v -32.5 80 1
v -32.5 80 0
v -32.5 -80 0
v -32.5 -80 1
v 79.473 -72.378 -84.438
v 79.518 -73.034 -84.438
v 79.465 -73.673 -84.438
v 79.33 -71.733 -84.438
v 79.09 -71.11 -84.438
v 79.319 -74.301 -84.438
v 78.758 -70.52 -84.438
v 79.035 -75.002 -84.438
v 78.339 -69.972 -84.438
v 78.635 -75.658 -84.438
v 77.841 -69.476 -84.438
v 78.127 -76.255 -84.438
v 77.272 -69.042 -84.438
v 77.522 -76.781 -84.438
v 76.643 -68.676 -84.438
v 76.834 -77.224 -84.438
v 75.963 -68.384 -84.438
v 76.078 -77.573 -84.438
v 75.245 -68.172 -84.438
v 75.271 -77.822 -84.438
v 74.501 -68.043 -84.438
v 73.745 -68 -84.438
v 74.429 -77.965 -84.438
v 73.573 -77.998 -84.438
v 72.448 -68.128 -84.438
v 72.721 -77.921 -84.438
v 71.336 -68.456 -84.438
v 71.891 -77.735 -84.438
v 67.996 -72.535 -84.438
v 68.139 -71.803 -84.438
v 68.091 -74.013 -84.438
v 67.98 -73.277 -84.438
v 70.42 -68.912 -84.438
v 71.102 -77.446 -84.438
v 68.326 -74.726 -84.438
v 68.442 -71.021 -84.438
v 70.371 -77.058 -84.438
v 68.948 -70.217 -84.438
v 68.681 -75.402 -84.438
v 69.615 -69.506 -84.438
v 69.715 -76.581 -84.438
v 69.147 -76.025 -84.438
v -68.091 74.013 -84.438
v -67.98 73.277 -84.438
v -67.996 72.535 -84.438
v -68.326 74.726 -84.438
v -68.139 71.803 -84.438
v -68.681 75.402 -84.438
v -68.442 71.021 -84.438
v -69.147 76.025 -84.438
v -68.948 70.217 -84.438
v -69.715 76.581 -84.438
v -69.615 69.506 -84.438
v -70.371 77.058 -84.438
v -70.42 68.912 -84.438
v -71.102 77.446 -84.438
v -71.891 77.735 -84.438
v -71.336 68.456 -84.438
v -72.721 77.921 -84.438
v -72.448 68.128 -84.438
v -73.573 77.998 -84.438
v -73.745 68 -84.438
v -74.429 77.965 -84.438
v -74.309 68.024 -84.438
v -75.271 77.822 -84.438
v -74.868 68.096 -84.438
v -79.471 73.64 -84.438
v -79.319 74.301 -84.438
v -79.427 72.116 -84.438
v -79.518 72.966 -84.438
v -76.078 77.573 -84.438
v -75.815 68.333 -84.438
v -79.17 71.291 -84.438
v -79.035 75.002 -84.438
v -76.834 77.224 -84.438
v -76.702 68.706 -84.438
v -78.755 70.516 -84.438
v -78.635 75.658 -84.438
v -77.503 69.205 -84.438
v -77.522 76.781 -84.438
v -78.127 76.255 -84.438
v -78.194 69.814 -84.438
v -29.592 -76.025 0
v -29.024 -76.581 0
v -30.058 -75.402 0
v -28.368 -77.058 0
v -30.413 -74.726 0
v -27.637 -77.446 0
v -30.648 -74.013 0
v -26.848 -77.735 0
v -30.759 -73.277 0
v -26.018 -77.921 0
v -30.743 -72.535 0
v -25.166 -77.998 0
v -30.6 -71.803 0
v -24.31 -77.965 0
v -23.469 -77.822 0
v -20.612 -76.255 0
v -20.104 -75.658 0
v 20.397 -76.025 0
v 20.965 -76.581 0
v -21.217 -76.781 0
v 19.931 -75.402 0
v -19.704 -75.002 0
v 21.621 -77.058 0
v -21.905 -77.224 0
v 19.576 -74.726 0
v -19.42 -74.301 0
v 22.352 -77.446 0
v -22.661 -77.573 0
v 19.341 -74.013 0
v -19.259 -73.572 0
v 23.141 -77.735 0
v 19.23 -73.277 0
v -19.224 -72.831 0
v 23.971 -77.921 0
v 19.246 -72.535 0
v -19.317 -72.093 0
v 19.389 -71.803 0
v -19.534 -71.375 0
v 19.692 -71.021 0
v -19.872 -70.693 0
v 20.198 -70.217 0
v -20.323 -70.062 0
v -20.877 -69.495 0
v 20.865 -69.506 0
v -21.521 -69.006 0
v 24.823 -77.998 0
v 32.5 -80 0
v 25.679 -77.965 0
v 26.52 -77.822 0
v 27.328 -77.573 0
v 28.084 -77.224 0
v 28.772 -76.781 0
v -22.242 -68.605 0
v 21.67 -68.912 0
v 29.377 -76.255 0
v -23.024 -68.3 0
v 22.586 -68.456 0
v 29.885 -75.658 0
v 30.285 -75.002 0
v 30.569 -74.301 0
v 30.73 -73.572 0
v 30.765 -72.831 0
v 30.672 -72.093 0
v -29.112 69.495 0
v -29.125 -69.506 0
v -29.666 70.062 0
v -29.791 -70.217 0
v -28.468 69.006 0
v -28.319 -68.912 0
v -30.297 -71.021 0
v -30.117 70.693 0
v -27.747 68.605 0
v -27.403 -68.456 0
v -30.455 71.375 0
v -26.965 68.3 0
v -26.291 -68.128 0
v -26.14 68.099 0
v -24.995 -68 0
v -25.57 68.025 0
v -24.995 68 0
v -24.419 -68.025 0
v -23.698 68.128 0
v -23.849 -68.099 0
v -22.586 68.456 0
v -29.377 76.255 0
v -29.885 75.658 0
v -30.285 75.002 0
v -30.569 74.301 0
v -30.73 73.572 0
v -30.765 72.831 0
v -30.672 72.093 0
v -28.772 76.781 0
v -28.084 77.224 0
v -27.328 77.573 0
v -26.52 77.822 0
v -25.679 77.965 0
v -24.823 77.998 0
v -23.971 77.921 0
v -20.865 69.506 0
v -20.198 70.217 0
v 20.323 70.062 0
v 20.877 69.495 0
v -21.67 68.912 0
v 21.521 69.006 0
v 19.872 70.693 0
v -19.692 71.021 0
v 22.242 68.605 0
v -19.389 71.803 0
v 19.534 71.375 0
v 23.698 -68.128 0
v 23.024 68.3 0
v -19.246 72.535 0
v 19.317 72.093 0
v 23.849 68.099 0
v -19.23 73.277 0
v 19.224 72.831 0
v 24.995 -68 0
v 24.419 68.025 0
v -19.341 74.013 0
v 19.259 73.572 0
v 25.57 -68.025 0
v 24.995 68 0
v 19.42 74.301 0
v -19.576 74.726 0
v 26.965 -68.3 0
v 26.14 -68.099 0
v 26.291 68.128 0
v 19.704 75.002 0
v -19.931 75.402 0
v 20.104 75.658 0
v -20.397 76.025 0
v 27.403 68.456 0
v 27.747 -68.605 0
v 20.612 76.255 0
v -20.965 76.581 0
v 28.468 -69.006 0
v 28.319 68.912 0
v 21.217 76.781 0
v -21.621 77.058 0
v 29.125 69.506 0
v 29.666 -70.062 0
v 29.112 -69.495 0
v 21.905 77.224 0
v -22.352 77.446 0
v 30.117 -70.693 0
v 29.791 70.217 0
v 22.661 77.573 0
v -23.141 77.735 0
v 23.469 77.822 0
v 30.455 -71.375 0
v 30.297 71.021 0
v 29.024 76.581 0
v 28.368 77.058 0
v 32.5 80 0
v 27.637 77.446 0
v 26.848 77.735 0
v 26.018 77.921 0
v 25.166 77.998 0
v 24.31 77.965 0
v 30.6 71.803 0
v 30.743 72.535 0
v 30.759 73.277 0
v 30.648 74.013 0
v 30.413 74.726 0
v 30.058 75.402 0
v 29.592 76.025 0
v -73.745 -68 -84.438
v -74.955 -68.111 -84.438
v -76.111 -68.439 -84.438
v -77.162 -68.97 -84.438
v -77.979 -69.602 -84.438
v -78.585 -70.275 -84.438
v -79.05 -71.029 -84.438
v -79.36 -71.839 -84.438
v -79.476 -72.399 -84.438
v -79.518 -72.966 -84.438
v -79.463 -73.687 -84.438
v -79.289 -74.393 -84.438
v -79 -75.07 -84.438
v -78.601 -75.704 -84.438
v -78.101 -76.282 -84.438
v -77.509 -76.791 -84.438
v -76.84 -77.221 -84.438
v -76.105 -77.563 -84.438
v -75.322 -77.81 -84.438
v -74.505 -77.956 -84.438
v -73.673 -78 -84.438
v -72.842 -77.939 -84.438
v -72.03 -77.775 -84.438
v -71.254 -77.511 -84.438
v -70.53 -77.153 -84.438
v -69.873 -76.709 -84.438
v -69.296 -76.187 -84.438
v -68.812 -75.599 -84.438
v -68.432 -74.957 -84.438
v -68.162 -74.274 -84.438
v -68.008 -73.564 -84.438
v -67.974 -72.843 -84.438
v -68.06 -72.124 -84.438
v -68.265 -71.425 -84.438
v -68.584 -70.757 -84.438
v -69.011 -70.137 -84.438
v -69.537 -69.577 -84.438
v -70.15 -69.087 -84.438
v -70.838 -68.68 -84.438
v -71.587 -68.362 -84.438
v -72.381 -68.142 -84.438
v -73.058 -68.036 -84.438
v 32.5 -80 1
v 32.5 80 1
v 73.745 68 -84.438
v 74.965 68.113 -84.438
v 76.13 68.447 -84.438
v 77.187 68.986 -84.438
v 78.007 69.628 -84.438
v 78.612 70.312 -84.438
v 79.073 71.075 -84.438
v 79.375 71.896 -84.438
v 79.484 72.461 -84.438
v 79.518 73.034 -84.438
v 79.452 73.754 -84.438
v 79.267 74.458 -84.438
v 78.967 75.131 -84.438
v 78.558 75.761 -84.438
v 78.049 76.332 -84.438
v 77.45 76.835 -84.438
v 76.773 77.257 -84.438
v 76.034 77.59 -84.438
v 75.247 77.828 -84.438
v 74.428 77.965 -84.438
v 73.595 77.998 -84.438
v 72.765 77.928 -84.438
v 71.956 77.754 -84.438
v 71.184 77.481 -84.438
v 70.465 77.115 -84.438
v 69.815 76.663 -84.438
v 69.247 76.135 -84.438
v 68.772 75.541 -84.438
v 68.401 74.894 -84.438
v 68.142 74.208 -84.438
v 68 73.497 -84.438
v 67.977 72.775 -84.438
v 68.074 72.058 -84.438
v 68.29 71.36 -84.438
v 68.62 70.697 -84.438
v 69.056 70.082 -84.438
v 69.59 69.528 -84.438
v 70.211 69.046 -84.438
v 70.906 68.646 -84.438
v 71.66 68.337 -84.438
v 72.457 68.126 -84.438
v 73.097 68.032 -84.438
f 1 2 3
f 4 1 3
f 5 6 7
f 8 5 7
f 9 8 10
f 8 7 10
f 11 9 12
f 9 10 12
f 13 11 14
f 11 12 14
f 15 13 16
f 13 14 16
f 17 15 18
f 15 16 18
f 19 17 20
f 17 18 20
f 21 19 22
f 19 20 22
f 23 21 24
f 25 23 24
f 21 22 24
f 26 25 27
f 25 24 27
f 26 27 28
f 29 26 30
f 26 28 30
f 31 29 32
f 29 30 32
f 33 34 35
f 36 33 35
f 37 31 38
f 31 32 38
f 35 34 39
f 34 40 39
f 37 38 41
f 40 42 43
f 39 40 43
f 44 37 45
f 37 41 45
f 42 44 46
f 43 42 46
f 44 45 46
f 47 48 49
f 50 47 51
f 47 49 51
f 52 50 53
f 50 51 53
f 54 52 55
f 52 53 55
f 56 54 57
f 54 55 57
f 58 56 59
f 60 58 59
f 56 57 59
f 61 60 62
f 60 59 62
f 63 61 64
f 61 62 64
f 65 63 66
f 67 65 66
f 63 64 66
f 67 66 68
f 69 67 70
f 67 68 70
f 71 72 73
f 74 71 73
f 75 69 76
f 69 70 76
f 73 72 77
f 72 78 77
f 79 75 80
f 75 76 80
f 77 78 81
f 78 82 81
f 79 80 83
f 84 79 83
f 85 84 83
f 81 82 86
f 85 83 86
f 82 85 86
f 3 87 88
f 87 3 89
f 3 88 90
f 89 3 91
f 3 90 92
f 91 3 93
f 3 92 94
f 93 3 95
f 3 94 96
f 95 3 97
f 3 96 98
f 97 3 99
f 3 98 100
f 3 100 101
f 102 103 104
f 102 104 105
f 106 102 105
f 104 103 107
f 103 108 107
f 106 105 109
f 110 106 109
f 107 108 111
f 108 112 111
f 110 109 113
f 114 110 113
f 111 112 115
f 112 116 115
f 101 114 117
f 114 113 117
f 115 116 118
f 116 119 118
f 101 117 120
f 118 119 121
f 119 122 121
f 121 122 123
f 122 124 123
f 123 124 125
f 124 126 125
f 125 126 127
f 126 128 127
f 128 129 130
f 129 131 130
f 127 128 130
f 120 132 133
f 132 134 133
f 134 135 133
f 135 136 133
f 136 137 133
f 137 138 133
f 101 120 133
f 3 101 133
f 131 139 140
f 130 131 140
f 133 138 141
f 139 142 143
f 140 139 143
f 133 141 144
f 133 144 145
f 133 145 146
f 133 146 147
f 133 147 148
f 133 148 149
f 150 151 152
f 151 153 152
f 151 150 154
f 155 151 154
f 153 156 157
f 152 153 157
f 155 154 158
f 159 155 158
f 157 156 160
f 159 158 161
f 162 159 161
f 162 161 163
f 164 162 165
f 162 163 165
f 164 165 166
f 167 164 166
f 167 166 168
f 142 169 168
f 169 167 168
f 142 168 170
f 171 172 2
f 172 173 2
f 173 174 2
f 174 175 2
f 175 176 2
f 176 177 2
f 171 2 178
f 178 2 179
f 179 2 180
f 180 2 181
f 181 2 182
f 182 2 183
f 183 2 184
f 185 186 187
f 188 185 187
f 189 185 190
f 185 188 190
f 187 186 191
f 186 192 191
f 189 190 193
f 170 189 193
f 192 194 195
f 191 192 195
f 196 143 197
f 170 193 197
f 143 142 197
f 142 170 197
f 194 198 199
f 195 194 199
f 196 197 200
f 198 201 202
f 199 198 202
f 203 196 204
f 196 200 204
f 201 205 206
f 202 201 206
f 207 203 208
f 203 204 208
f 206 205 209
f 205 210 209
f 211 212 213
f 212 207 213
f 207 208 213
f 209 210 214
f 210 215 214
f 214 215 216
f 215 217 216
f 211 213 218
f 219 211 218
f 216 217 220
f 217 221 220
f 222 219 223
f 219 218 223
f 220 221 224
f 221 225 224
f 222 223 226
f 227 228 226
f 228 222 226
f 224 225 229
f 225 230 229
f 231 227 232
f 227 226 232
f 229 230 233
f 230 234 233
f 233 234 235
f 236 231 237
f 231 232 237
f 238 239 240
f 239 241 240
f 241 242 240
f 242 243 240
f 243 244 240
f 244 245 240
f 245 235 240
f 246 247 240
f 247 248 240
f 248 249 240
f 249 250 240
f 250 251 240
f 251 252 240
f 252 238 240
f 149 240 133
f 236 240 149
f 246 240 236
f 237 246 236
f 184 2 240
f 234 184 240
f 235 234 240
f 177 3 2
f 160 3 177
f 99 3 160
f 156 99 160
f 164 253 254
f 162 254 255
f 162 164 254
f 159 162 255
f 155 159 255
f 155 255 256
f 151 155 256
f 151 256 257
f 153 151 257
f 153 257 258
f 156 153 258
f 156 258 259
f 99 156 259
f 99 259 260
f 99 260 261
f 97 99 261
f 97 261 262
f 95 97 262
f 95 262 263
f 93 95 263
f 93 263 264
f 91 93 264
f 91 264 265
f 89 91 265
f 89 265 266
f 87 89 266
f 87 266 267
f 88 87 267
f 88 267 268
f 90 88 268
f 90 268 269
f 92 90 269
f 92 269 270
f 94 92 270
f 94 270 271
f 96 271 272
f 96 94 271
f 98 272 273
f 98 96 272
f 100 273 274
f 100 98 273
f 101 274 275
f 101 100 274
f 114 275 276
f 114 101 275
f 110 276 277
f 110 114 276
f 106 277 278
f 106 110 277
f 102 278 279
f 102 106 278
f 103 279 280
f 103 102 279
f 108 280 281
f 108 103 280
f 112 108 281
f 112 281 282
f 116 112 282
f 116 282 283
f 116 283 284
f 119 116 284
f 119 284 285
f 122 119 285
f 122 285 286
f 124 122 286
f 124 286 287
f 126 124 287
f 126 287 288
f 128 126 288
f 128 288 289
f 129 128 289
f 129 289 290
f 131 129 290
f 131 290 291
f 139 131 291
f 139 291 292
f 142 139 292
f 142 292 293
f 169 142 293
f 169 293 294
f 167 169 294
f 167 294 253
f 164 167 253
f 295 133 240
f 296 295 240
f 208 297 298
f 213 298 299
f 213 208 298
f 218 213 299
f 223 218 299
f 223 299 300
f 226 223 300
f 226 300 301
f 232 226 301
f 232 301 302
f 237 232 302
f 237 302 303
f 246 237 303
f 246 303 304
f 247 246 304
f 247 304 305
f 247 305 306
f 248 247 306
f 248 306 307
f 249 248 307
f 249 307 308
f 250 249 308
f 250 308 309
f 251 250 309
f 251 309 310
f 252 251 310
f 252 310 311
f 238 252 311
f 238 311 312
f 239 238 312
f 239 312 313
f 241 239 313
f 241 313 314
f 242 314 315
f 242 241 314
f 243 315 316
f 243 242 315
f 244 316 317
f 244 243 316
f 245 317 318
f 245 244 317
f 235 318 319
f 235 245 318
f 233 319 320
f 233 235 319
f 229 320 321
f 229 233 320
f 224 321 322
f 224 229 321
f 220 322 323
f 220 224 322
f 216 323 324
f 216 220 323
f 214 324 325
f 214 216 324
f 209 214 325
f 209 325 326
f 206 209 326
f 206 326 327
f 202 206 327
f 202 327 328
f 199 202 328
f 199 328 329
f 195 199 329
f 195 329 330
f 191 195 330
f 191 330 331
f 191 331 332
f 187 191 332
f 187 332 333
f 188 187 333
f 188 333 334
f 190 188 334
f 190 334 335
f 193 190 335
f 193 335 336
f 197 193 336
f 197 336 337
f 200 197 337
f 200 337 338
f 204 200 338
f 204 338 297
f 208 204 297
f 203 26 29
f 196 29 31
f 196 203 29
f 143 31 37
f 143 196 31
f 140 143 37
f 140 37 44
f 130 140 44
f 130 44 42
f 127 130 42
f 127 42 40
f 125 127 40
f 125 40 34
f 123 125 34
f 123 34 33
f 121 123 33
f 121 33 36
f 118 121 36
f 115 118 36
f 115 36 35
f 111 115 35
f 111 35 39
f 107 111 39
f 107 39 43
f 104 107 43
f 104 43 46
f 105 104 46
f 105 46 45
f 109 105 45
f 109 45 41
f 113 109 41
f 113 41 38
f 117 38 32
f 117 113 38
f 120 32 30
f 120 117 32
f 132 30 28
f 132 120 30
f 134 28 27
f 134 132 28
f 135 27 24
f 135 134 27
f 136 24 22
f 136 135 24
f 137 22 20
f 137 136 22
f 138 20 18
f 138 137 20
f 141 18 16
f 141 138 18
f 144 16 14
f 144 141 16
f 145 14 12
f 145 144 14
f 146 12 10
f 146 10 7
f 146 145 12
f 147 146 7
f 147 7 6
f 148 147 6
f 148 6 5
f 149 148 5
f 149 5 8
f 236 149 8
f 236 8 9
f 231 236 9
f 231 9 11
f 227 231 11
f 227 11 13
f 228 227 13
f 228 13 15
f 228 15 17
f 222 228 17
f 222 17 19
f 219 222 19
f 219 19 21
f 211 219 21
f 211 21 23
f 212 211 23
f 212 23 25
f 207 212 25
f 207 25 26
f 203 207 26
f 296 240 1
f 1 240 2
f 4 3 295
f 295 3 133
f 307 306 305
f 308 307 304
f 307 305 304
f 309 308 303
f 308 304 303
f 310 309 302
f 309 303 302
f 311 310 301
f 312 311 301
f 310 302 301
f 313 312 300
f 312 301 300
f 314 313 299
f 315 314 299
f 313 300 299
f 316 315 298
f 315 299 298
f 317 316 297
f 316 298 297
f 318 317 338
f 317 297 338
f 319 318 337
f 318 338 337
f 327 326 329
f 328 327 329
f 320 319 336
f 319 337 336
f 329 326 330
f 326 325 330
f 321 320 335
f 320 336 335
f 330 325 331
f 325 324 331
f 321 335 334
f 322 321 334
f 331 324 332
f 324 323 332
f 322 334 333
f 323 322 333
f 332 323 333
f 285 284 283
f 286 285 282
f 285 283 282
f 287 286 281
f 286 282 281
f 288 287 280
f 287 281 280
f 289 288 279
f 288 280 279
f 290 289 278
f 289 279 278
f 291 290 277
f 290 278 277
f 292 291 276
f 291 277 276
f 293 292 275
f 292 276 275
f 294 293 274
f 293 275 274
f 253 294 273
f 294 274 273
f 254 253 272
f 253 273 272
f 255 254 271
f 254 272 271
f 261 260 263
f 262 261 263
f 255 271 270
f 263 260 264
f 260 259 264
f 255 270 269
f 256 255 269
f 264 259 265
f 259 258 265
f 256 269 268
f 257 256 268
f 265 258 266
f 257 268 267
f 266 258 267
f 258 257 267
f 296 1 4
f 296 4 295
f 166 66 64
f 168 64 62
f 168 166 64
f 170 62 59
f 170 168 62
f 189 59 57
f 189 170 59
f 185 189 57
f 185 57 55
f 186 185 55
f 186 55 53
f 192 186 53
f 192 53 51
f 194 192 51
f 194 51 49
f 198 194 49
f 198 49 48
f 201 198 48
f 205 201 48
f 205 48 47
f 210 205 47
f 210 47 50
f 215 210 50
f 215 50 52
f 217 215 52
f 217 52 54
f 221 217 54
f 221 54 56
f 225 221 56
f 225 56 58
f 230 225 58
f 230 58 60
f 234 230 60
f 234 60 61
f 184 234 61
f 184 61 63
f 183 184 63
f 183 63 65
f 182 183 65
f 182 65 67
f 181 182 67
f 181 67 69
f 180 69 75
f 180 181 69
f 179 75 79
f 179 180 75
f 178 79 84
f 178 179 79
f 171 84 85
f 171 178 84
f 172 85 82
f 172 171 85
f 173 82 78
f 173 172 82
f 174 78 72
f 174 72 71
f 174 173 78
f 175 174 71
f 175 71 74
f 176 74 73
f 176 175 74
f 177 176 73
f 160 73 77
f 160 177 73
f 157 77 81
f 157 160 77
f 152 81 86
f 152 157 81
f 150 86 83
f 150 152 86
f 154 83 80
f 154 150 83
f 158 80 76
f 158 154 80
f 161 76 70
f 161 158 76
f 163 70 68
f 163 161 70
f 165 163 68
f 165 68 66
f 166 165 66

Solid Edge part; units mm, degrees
sketch "Sketch1" plane through (0, 0, 0) normal (0, 0, 1) x (1, 0, 0)
  line L0 (32.5, 80) -> (-32.5, 80)
  line L1 (-32.5, 80) -> (-32.5, -80)
  line L2 (-32.5, -80) -> (32.5, -80)
  line L3 (32.5, -80) -> (32.5, 80)
  dimension "D1" = 65
  dimension "D2" = 160
extrude "Protrusion1" add sketch "Sketch1" along normal blind 1
sketch "Sketch2" plane through (5.2285, 0, 16.7452) normal (0.5, 0, 0.8660254) x (0, 1, 0)
  circle A0 centre (-73, 17.8013) radius 5
  dimension "D1" = 10
  dimension "D2" = 7
extrude "ProtrusioneEstrusa_4" add sketch "Sketch2" against normal blind 130
mirror "Mirror1" about plane through (0, 0, 0) normal (1, 0, 0) of "ProtrusioneEstrusa_4"
mirror "Mirror2" about plane through (0, 0, 0) normal (0, -1, 0) of "Mirror1", "ProtrusioneEstrusa_4"
sketch "Sketch3" plane through (0, -80, 1.5) normal (0, -1, 0) x (1, 0, 0)
  line L0 (32.5, 26.6458) -> (-32.5, 26.6458)
  line L1 (-32.5, 26.6458) -> (-32.5, -0.5)
  line L2 (-32.5, -0.5) -> (32.5, -0.5)
  line L3 (32.5, -0.5) -> (32.5, 26.6458)
extrude "Cutout1" cut sketch "Sketch3" against normal through all
sketch "Sketch4" plane through (0, -80, 1.5) normal (0, -1, 0) x (1, 0, 0)
  line L0 (79.5179, -85.9375) -> (-79.5179, -85.9375)
  line L1 (-79.5179, -85.9375) -> (-79.5179, -90.9375)
  line L2 (-79.5179, -90.9375) -> (79.5179, -90.9375)
  line L3 (79.5179, -90.9375) -> (79.5179, -85.9375)
extrude "Cutout2" cut sketch "Sketch4" against normal through all
properties material "Fe 360 B UNI 7070"
